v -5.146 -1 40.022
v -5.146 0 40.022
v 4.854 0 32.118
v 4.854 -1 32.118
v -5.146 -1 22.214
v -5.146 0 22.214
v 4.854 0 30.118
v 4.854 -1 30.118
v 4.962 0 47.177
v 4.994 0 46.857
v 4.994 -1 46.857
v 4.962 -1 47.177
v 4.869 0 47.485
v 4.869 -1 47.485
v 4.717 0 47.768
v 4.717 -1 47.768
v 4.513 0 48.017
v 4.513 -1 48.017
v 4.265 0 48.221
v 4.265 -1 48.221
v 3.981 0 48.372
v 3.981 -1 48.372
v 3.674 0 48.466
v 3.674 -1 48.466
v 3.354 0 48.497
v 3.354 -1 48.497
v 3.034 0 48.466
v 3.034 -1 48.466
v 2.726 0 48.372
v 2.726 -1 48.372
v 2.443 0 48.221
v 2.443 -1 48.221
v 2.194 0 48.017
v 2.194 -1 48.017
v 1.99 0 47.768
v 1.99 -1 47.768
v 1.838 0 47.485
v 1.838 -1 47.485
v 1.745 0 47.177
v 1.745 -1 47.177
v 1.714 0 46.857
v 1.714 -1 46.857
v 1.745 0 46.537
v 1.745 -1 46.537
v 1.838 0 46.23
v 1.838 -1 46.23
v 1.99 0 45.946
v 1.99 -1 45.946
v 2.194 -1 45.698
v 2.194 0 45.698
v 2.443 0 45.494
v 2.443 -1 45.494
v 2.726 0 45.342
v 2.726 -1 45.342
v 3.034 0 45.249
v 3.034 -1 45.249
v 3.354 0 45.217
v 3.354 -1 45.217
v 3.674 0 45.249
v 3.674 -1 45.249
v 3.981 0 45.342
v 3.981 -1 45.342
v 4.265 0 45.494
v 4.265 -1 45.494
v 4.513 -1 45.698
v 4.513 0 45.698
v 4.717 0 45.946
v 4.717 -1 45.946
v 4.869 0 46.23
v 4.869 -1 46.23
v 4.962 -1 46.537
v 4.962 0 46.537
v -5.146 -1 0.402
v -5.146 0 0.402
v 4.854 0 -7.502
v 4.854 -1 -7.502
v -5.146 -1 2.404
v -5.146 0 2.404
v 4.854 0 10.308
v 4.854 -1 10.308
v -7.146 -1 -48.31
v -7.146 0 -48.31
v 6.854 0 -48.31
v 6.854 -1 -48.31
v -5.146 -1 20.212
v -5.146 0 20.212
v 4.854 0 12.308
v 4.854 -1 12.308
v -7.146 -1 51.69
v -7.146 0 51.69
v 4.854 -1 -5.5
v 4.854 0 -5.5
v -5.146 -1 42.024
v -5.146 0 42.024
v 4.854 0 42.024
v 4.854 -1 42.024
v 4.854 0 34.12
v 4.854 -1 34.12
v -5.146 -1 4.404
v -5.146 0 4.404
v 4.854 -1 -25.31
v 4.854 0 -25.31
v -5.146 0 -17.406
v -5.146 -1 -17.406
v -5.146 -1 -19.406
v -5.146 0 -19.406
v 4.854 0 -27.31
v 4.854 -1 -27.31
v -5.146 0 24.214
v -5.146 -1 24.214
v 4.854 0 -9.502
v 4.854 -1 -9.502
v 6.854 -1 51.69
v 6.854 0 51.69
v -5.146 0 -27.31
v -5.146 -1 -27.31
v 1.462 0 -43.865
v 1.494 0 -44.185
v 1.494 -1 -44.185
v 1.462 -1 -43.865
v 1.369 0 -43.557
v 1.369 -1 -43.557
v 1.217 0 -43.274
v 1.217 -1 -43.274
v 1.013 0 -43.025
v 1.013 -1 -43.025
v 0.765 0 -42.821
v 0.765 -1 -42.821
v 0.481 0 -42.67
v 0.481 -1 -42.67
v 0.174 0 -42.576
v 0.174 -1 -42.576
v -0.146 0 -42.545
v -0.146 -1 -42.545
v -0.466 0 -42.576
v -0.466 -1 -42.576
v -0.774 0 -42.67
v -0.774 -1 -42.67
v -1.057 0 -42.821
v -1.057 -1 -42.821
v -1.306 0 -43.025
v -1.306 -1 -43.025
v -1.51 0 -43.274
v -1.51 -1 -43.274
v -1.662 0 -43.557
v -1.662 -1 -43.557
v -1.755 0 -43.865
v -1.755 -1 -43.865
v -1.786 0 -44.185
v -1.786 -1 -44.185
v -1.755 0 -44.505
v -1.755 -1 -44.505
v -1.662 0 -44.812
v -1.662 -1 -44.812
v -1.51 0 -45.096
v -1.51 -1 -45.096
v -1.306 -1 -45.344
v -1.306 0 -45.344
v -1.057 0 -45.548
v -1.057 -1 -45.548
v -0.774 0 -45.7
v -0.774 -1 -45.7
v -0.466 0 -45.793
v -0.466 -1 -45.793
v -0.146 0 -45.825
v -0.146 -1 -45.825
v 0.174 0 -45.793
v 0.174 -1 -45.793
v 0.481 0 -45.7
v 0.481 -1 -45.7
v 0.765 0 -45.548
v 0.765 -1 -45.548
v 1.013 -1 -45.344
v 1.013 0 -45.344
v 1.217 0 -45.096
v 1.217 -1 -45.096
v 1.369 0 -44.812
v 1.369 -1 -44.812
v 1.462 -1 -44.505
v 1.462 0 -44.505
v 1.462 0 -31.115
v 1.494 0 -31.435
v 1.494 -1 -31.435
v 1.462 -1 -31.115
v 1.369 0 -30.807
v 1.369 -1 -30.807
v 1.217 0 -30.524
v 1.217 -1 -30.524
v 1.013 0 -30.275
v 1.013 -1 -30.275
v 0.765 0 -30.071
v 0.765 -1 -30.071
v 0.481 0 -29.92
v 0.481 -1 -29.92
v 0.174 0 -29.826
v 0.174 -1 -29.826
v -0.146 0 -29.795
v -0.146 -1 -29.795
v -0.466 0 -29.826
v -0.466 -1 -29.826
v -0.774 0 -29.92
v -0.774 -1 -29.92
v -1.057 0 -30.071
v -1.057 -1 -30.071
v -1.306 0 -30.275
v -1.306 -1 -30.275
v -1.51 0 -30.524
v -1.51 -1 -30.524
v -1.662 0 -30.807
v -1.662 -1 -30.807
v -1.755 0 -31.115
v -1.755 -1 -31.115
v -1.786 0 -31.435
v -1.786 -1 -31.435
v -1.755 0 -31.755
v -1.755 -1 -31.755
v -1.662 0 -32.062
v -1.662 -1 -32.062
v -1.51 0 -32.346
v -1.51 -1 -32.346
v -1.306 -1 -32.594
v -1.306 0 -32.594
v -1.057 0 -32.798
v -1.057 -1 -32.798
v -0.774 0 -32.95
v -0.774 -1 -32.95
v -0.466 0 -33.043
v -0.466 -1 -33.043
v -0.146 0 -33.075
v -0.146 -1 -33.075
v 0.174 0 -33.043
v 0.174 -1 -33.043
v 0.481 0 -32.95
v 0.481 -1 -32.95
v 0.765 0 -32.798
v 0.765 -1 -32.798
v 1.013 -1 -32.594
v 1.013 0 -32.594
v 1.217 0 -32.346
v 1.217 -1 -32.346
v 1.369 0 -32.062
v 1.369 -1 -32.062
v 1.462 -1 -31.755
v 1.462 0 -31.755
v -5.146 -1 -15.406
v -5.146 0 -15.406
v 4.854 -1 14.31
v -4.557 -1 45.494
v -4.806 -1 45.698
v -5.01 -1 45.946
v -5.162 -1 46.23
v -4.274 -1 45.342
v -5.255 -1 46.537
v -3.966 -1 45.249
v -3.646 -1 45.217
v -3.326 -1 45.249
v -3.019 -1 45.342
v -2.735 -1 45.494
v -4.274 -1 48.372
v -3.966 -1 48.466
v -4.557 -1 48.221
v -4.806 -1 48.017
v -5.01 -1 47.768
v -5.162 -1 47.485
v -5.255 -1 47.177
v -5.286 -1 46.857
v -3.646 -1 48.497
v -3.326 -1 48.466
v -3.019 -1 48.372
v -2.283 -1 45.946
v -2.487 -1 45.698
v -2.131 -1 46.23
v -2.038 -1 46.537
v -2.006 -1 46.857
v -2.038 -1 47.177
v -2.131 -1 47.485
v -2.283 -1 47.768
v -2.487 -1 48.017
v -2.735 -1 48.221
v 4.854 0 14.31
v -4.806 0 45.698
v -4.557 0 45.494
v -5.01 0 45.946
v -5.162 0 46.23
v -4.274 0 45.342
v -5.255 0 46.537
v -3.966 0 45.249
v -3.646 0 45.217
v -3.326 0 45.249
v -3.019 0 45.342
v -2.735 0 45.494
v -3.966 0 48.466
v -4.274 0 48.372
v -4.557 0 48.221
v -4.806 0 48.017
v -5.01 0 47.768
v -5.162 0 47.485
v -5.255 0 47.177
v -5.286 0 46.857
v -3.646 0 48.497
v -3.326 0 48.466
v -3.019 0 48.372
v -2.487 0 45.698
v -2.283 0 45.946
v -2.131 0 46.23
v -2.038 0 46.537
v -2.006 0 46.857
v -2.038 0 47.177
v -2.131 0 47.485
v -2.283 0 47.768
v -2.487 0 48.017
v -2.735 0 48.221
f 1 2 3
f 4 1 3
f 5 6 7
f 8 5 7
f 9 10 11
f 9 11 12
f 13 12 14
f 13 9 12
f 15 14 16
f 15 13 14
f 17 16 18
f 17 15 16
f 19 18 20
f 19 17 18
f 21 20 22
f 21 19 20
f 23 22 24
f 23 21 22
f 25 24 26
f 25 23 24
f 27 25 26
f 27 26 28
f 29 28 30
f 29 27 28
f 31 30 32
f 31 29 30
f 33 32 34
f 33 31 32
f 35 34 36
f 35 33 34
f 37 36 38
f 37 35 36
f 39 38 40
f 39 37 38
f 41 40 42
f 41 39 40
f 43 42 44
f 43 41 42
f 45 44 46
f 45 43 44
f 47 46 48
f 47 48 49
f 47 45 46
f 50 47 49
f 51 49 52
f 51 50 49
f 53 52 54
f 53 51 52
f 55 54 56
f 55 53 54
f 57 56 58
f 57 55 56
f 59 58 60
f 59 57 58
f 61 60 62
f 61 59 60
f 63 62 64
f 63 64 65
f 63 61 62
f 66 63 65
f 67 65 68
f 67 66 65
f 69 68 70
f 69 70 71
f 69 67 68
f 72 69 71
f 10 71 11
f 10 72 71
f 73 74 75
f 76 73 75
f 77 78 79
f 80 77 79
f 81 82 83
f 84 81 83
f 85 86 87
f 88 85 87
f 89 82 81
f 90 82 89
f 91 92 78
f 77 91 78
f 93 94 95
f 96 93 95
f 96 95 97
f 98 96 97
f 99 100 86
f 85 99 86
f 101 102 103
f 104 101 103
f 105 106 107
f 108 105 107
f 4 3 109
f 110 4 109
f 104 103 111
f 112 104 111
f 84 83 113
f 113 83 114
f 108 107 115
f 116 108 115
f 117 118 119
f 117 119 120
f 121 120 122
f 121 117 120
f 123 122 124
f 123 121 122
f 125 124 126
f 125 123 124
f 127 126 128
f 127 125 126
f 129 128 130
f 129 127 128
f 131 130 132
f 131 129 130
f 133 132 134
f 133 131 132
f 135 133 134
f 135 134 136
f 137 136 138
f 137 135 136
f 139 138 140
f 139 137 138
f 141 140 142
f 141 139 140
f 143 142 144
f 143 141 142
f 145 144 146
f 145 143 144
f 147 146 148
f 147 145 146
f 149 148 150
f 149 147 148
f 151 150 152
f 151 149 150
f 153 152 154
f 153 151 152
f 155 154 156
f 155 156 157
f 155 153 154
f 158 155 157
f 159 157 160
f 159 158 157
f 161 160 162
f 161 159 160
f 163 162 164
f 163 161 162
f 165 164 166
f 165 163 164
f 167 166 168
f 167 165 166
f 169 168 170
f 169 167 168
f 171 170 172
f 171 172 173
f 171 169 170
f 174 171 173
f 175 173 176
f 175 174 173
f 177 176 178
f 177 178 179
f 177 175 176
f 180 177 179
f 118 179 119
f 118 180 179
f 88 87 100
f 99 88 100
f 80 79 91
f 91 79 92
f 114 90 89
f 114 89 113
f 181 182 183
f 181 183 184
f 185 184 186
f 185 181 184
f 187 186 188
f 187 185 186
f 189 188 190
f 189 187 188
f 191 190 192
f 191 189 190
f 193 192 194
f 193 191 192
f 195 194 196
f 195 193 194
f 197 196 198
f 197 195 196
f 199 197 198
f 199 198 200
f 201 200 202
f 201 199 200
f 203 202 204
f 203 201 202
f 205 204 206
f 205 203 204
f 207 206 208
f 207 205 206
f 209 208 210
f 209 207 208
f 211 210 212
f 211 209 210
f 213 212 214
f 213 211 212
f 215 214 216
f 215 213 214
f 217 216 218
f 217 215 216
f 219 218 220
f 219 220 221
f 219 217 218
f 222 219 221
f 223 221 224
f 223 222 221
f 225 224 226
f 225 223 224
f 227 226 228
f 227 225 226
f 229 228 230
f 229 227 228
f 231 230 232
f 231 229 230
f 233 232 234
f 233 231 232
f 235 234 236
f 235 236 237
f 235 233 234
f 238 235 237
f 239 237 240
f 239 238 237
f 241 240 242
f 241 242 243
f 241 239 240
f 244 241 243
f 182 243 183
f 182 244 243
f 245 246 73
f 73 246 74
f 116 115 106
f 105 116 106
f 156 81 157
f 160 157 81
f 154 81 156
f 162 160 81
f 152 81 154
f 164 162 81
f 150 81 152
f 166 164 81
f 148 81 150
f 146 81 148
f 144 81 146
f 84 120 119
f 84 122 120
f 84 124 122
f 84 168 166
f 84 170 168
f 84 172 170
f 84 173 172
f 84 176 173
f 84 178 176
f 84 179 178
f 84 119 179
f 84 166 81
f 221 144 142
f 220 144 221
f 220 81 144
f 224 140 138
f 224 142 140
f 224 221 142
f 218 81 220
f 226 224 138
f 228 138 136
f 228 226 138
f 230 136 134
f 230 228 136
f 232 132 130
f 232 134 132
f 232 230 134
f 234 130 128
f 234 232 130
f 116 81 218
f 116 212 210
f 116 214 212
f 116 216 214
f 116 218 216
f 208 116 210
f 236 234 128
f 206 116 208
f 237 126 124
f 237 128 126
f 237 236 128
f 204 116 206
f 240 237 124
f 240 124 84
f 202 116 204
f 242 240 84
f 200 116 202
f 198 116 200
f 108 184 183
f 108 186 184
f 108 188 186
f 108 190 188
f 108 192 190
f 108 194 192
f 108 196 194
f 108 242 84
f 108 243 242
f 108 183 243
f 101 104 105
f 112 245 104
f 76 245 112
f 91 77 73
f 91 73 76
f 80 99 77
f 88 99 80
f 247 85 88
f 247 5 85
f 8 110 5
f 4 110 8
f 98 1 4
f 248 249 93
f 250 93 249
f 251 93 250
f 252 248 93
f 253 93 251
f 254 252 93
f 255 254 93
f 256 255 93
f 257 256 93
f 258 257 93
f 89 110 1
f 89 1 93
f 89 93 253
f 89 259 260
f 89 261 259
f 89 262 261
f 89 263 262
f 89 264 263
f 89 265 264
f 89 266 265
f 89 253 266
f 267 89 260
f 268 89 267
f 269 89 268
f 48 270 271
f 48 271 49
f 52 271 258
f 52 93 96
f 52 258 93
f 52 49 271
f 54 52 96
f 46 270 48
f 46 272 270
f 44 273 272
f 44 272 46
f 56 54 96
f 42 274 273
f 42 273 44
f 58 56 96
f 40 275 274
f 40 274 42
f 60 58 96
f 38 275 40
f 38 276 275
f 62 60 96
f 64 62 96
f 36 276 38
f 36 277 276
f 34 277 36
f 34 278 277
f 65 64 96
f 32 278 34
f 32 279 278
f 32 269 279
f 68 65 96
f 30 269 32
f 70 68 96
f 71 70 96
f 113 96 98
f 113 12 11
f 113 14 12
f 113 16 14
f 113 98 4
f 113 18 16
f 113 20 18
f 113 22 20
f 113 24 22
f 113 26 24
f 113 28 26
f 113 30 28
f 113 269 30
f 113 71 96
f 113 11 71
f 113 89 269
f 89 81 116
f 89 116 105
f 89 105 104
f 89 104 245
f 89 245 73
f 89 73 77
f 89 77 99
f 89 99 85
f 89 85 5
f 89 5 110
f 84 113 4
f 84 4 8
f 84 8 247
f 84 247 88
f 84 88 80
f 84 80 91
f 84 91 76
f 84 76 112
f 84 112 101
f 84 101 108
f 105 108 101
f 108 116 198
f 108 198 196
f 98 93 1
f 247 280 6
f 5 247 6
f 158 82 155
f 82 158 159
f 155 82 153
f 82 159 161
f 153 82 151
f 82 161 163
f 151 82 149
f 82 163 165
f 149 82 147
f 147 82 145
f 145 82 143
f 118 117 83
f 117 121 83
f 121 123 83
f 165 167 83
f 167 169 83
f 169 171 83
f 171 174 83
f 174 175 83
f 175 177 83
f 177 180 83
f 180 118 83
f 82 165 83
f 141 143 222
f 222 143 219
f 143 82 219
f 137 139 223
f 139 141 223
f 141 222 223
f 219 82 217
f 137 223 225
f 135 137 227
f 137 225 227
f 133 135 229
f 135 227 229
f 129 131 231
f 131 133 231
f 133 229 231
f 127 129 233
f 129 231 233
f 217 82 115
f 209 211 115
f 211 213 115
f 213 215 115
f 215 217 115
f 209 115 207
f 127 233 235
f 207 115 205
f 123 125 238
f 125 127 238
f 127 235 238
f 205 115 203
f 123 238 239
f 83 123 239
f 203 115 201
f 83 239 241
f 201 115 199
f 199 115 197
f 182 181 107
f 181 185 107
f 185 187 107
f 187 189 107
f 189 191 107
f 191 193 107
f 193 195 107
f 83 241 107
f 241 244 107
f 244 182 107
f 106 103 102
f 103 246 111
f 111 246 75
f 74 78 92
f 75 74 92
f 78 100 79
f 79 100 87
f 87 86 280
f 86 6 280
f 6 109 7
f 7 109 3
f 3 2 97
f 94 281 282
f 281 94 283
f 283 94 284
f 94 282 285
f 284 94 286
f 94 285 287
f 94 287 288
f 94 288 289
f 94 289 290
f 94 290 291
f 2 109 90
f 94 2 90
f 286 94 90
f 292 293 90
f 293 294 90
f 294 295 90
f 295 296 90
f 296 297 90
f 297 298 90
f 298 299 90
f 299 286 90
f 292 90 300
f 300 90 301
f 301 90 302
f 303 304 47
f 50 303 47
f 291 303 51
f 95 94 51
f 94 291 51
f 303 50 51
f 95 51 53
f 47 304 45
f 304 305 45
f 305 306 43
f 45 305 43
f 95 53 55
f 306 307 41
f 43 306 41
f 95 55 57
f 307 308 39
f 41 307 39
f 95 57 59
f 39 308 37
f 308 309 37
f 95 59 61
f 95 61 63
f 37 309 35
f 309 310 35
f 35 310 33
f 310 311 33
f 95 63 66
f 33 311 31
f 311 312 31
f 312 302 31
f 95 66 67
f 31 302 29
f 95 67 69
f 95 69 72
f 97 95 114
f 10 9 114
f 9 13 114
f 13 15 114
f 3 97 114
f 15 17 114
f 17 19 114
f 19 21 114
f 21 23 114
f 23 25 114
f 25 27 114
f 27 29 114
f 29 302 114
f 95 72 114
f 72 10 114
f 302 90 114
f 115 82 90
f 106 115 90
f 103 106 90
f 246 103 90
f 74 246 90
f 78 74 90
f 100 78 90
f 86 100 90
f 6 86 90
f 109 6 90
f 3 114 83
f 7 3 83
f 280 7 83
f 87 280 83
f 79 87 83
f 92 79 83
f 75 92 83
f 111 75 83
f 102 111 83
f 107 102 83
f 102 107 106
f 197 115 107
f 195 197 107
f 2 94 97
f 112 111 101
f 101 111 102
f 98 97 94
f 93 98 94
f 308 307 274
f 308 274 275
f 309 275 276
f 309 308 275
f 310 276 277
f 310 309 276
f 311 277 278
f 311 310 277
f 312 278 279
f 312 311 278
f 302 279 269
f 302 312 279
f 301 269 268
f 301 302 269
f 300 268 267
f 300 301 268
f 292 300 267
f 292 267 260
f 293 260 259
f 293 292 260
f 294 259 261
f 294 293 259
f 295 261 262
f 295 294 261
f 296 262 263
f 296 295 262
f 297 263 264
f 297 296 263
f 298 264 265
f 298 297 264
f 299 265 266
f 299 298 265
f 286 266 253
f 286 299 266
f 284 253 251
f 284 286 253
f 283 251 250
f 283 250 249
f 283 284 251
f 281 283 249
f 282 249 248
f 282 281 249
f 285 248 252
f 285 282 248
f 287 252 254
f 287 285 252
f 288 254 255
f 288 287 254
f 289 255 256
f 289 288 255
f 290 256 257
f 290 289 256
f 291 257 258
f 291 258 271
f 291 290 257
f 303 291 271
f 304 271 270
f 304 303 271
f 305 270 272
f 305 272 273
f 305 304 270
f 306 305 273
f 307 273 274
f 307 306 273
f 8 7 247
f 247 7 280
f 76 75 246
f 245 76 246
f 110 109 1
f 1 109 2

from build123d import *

# Parameters (mm, degrees)
F0_W     = 14
F0_H     = 100
F0_R     = 1.64
F1_DEPTH = 1


with BuildPart() as f1:
    # F0 (on Front) → F1 (new body)
    with BuildSketch(Plane.XZ):
        with Locations((-0.146341, 1.690268)):
            Rectangle(F0_W, F0_H)
        with Locations((-0.146341, -44.184732)):
            Circle(F0_R, mode=Mode.SUBTRACT)
        with Locations((-0.146341, -31.434732)):
            Circle(F0_R, mode=Mode.SUBTRACT)
        Polygon((-5.146341, -19.405732), (4.853659, -27.309732), (-5.146341, -27.309732), align=None, mode=Mode.SUBTRACT)
        Polygon((-5.146341, -17.405732), (4.853659, -9.501732), (4.853659, -25.309732), align=None, mode=Mode.SUBTRACT)
        Polygon((-5.146341, -15.405732), (-5.146341, 0.402268), (4.853659, -7.501732), align=None, mode=Mode.SUBTRACT)
        Polygon((4.853659, -5.499732), (-5.146341, 2.404268), (4.853659, 10.308268), align=None, mode=Mode.SUBTRACT)
        Polygon((-5.146341, 20.212268), (4.853659, 12.308268), (-5.146341, 4.404268), align=None, mode=Mode.SUBTRACT)
        Polygon((-5.146341, 22.214268), (4.853659, 30.118268), (4.853659, 14.310268), align=None, mode=Mode.SUBTRACT)
        Polygon((4.853659, 32.118268), (-5.146341, 24.214268), (-5.146341, 40.022268), align=None, mode=Mode.SUBTRACT)
        Polygon((-5.146341, 42.024268), (4.853659, 42.024268), (4.853659, 34.120268), align=None, mode=Mode.SUBTRACT)
        with Locations((-3.646341, 46.857268)):
            Circle(F0_R, mode=Mode.SUBTRACT)
        with Locations((3.353659, 46.857268)):
            Circle(F0_R, mode=Mode.SUBTRACT)
    extrude(amount=F1_DEPTH)


solid = f1.part
